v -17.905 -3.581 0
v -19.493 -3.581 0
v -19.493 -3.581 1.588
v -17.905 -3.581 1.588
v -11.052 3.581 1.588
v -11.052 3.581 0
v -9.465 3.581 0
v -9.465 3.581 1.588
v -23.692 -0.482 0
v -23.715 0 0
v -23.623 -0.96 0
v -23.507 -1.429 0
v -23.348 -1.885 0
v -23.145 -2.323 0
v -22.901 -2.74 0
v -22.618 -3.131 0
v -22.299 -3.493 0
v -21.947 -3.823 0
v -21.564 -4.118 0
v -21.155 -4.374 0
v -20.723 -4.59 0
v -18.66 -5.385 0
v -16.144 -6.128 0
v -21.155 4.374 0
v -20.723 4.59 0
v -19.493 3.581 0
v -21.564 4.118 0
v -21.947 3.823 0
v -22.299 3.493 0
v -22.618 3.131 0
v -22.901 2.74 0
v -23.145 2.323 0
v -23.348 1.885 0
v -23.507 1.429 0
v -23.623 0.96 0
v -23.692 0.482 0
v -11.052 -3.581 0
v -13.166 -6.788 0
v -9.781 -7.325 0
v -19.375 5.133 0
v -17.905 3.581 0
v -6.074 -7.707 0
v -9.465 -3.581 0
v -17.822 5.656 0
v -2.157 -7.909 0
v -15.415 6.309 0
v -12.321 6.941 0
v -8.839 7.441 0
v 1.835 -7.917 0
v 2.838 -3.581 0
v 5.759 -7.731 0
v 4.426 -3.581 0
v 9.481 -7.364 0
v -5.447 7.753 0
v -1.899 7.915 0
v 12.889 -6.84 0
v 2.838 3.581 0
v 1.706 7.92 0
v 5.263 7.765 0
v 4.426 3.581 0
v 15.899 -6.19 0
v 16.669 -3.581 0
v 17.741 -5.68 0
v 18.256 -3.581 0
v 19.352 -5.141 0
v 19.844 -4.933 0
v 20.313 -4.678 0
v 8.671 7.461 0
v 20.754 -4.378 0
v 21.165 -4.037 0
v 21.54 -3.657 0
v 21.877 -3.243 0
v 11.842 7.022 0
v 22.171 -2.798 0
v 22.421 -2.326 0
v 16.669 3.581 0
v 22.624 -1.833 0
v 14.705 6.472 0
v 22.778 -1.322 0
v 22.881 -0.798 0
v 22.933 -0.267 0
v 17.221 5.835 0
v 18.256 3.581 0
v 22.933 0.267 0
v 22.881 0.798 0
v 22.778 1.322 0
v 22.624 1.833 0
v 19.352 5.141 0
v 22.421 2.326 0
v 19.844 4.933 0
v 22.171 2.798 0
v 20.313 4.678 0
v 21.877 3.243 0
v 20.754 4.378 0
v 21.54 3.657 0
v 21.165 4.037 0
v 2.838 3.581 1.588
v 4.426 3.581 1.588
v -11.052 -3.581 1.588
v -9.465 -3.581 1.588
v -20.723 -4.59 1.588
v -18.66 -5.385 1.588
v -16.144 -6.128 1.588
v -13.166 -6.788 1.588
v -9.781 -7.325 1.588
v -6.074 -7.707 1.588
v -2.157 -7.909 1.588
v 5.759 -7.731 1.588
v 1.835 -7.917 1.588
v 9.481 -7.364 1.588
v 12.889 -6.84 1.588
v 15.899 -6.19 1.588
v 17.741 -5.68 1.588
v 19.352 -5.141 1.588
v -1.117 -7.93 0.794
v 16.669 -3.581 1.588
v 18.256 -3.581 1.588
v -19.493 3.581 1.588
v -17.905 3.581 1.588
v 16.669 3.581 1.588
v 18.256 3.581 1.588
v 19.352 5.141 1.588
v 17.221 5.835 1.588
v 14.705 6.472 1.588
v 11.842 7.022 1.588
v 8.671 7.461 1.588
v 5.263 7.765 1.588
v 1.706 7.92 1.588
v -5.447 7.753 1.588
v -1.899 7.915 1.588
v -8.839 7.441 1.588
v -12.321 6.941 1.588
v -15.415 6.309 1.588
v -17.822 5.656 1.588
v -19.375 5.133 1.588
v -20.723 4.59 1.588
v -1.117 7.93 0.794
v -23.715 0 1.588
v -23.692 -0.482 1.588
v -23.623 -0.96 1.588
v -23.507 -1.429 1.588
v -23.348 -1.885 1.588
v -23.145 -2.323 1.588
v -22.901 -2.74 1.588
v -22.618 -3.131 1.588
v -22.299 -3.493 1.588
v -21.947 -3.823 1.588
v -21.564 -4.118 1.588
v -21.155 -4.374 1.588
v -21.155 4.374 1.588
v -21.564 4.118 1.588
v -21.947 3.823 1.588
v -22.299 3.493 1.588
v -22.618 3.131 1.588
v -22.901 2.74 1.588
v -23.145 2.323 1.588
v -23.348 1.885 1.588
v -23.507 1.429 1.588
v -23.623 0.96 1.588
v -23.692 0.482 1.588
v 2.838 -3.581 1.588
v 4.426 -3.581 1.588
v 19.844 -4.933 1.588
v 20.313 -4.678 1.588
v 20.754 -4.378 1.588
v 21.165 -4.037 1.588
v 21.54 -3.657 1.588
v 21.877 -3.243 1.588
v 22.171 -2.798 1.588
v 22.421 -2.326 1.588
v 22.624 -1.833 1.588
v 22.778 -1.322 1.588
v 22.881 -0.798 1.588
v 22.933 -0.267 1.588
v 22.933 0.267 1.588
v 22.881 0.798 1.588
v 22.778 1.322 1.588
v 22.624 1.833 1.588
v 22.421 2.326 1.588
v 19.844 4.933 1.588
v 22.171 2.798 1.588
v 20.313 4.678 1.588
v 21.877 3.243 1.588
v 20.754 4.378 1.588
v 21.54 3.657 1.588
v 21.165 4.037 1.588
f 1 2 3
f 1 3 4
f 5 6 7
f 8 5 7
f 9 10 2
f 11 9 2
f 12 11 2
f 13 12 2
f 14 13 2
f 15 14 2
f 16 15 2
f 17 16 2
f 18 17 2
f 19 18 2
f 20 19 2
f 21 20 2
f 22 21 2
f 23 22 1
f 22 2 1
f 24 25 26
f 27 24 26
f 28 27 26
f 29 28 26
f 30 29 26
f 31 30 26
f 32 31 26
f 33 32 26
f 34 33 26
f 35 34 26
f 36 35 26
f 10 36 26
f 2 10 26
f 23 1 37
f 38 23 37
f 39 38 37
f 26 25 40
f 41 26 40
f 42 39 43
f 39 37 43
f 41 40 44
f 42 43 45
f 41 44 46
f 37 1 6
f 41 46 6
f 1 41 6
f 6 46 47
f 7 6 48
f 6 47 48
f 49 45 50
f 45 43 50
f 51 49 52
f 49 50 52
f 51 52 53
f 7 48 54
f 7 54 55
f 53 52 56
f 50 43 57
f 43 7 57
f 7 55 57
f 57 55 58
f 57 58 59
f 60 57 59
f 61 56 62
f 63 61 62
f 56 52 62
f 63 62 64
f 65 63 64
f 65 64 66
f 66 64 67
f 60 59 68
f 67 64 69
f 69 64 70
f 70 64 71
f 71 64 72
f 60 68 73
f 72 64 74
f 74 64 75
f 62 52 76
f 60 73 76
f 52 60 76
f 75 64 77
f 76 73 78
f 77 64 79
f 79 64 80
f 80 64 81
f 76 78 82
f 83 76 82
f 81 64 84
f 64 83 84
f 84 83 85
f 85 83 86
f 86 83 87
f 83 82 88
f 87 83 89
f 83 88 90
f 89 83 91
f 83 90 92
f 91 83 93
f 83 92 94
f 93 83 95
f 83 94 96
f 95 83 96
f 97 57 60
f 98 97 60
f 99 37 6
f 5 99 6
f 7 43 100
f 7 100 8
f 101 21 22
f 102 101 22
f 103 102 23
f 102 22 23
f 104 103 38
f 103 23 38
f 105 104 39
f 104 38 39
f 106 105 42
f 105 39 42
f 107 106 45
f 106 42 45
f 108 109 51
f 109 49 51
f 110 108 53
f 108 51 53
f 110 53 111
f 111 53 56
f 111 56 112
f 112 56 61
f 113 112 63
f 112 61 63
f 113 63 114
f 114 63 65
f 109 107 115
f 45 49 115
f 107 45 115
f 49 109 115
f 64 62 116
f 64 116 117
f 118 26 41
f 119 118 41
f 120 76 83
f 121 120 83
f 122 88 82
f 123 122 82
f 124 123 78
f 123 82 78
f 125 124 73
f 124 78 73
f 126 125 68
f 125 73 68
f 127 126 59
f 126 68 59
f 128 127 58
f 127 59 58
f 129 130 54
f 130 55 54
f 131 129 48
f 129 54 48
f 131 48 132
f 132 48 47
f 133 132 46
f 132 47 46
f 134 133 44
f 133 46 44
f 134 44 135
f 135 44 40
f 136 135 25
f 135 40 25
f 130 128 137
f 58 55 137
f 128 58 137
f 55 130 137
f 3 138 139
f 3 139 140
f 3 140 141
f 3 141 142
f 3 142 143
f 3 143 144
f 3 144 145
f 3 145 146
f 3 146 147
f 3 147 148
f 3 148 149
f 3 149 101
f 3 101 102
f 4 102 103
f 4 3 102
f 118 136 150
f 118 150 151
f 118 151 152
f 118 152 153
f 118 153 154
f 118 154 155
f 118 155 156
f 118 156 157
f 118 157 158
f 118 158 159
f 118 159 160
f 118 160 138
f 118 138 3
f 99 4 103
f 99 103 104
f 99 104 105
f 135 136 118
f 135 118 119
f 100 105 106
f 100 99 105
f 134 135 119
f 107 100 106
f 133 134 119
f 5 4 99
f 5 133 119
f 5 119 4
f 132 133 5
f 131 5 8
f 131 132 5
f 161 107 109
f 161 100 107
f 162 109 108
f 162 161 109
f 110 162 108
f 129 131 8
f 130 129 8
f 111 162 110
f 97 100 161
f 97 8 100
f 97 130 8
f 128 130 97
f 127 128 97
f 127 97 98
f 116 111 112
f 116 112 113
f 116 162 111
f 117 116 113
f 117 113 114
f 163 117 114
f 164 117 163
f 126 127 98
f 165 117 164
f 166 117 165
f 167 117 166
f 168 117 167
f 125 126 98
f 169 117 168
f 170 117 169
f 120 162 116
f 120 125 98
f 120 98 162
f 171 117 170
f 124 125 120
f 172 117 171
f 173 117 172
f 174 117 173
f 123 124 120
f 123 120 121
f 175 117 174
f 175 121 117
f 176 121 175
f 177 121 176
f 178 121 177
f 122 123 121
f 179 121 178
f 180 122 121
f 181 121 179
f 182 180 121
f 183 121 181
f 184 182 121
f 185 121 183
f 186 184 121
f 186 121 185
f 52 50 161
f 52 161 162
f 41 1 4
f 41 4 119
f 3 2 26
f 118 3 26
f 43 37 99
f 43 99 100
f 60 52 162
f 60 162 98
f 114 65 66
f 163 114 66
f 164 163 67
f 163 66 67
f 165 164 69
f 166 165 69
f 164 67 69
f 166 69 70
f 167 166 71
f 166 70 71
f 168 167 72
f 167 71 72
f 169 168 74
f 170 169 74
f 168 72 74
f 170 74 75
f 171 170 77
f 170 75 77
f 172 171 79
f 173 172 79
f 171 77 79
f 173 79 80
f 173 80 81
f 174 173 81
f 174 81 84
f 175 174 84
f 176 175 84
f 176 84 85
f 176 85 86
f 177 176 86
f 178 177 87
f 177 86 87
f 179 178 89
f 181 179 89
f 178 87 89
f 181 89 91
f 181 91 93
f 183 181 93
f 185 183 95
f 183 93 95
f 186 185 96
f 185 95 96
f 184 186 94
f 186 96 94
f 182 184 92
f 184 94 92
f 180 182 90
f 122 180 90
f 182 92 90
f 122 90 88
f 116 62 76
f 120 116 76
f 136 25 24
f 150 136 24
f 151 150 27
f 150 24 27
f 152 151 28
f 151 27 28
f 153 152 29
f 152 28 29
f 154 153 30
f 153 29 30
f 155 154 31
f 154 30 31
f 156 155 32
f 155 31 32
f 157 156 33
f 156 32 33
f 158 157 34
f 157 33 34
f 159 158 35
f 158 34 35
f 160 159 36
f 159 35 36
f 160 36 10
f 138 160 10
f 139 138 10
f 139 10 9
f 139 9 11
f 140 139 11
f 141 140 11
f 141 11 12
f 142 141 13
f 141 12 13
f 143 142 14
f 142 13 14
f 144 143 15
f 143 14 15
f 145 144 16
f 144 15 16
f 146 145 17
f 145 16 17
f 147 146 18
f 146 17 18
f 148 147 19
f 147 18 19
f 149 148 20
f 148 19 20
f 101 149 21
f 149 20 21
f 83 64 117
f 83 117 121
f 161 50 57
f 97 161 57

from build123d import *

# Parameters (mm, degrees)
SKETCH1_W           = 1.5875
SKETCH1_H           = 7.1628
BOSS_EXTRUDE1_DEPTH = 1.5875


with BuildPart() as part:
    # Sketch1 → Boss-Extrude1 (new body)
    with BuildSketch(Plane.XY):
        with BuildLine():
            ThreePointArc((-20.722796249, 4.589876297), (-23.715296357, 7.4e-08), (-20.722796383, -4.589876237))
            add(Edge.make_bspline(
                [(-20.722796383, -4.589876237), (-1.820130831, -12.924202126), (19.352380946, -5.14103201)],
                knots=[3.758177337, 3.758177337, 3.758177337, 5.578637888, 5.578637888, 5.578637888], degree=2, weights=[1, 0.61356393, 1]))
            ThreePointArc((19.352380946, -5.14103201), (22.939895377, 0), (19.352380946, 5.14103201))
            add(Edge.make_bspline(
                [(19.352380946, 5.14103201), (-1.82013063, 12.924202052), (-20.722796249, 4.589876297)],
                knots=[0.704547419, 0.704547419, 0.704547419, 2.525007961, 2.525007961, 2.525007961], degree=2, weights=[1, 0.613563933, 1]))
        make_face()
        with Locations((-18.699085792, 0)):
            Rectangle(SKETCH1_W, SKETCH1_H, mode=Mode.SUBTRACT)
        with Locations((3.632105004, 0)):
            Rectangle(SKETCH1_W, SKETCH1_H, mode=Mode.SUBTRACT)
        with Locations((-10.258658934, 0)):
            Rectangle(SKETCH1_W, SKETCH1_H, mode=Mode.SUBTRACT)
        with Locations((17.4625, 0)):
            Rectangle(SKETCH1_W, SKETCH1_H, mode=Mode.SUBTRACT)
    extrude(amount=BOSS_EXTRUDE1_DEPTH)


solid = part.part
